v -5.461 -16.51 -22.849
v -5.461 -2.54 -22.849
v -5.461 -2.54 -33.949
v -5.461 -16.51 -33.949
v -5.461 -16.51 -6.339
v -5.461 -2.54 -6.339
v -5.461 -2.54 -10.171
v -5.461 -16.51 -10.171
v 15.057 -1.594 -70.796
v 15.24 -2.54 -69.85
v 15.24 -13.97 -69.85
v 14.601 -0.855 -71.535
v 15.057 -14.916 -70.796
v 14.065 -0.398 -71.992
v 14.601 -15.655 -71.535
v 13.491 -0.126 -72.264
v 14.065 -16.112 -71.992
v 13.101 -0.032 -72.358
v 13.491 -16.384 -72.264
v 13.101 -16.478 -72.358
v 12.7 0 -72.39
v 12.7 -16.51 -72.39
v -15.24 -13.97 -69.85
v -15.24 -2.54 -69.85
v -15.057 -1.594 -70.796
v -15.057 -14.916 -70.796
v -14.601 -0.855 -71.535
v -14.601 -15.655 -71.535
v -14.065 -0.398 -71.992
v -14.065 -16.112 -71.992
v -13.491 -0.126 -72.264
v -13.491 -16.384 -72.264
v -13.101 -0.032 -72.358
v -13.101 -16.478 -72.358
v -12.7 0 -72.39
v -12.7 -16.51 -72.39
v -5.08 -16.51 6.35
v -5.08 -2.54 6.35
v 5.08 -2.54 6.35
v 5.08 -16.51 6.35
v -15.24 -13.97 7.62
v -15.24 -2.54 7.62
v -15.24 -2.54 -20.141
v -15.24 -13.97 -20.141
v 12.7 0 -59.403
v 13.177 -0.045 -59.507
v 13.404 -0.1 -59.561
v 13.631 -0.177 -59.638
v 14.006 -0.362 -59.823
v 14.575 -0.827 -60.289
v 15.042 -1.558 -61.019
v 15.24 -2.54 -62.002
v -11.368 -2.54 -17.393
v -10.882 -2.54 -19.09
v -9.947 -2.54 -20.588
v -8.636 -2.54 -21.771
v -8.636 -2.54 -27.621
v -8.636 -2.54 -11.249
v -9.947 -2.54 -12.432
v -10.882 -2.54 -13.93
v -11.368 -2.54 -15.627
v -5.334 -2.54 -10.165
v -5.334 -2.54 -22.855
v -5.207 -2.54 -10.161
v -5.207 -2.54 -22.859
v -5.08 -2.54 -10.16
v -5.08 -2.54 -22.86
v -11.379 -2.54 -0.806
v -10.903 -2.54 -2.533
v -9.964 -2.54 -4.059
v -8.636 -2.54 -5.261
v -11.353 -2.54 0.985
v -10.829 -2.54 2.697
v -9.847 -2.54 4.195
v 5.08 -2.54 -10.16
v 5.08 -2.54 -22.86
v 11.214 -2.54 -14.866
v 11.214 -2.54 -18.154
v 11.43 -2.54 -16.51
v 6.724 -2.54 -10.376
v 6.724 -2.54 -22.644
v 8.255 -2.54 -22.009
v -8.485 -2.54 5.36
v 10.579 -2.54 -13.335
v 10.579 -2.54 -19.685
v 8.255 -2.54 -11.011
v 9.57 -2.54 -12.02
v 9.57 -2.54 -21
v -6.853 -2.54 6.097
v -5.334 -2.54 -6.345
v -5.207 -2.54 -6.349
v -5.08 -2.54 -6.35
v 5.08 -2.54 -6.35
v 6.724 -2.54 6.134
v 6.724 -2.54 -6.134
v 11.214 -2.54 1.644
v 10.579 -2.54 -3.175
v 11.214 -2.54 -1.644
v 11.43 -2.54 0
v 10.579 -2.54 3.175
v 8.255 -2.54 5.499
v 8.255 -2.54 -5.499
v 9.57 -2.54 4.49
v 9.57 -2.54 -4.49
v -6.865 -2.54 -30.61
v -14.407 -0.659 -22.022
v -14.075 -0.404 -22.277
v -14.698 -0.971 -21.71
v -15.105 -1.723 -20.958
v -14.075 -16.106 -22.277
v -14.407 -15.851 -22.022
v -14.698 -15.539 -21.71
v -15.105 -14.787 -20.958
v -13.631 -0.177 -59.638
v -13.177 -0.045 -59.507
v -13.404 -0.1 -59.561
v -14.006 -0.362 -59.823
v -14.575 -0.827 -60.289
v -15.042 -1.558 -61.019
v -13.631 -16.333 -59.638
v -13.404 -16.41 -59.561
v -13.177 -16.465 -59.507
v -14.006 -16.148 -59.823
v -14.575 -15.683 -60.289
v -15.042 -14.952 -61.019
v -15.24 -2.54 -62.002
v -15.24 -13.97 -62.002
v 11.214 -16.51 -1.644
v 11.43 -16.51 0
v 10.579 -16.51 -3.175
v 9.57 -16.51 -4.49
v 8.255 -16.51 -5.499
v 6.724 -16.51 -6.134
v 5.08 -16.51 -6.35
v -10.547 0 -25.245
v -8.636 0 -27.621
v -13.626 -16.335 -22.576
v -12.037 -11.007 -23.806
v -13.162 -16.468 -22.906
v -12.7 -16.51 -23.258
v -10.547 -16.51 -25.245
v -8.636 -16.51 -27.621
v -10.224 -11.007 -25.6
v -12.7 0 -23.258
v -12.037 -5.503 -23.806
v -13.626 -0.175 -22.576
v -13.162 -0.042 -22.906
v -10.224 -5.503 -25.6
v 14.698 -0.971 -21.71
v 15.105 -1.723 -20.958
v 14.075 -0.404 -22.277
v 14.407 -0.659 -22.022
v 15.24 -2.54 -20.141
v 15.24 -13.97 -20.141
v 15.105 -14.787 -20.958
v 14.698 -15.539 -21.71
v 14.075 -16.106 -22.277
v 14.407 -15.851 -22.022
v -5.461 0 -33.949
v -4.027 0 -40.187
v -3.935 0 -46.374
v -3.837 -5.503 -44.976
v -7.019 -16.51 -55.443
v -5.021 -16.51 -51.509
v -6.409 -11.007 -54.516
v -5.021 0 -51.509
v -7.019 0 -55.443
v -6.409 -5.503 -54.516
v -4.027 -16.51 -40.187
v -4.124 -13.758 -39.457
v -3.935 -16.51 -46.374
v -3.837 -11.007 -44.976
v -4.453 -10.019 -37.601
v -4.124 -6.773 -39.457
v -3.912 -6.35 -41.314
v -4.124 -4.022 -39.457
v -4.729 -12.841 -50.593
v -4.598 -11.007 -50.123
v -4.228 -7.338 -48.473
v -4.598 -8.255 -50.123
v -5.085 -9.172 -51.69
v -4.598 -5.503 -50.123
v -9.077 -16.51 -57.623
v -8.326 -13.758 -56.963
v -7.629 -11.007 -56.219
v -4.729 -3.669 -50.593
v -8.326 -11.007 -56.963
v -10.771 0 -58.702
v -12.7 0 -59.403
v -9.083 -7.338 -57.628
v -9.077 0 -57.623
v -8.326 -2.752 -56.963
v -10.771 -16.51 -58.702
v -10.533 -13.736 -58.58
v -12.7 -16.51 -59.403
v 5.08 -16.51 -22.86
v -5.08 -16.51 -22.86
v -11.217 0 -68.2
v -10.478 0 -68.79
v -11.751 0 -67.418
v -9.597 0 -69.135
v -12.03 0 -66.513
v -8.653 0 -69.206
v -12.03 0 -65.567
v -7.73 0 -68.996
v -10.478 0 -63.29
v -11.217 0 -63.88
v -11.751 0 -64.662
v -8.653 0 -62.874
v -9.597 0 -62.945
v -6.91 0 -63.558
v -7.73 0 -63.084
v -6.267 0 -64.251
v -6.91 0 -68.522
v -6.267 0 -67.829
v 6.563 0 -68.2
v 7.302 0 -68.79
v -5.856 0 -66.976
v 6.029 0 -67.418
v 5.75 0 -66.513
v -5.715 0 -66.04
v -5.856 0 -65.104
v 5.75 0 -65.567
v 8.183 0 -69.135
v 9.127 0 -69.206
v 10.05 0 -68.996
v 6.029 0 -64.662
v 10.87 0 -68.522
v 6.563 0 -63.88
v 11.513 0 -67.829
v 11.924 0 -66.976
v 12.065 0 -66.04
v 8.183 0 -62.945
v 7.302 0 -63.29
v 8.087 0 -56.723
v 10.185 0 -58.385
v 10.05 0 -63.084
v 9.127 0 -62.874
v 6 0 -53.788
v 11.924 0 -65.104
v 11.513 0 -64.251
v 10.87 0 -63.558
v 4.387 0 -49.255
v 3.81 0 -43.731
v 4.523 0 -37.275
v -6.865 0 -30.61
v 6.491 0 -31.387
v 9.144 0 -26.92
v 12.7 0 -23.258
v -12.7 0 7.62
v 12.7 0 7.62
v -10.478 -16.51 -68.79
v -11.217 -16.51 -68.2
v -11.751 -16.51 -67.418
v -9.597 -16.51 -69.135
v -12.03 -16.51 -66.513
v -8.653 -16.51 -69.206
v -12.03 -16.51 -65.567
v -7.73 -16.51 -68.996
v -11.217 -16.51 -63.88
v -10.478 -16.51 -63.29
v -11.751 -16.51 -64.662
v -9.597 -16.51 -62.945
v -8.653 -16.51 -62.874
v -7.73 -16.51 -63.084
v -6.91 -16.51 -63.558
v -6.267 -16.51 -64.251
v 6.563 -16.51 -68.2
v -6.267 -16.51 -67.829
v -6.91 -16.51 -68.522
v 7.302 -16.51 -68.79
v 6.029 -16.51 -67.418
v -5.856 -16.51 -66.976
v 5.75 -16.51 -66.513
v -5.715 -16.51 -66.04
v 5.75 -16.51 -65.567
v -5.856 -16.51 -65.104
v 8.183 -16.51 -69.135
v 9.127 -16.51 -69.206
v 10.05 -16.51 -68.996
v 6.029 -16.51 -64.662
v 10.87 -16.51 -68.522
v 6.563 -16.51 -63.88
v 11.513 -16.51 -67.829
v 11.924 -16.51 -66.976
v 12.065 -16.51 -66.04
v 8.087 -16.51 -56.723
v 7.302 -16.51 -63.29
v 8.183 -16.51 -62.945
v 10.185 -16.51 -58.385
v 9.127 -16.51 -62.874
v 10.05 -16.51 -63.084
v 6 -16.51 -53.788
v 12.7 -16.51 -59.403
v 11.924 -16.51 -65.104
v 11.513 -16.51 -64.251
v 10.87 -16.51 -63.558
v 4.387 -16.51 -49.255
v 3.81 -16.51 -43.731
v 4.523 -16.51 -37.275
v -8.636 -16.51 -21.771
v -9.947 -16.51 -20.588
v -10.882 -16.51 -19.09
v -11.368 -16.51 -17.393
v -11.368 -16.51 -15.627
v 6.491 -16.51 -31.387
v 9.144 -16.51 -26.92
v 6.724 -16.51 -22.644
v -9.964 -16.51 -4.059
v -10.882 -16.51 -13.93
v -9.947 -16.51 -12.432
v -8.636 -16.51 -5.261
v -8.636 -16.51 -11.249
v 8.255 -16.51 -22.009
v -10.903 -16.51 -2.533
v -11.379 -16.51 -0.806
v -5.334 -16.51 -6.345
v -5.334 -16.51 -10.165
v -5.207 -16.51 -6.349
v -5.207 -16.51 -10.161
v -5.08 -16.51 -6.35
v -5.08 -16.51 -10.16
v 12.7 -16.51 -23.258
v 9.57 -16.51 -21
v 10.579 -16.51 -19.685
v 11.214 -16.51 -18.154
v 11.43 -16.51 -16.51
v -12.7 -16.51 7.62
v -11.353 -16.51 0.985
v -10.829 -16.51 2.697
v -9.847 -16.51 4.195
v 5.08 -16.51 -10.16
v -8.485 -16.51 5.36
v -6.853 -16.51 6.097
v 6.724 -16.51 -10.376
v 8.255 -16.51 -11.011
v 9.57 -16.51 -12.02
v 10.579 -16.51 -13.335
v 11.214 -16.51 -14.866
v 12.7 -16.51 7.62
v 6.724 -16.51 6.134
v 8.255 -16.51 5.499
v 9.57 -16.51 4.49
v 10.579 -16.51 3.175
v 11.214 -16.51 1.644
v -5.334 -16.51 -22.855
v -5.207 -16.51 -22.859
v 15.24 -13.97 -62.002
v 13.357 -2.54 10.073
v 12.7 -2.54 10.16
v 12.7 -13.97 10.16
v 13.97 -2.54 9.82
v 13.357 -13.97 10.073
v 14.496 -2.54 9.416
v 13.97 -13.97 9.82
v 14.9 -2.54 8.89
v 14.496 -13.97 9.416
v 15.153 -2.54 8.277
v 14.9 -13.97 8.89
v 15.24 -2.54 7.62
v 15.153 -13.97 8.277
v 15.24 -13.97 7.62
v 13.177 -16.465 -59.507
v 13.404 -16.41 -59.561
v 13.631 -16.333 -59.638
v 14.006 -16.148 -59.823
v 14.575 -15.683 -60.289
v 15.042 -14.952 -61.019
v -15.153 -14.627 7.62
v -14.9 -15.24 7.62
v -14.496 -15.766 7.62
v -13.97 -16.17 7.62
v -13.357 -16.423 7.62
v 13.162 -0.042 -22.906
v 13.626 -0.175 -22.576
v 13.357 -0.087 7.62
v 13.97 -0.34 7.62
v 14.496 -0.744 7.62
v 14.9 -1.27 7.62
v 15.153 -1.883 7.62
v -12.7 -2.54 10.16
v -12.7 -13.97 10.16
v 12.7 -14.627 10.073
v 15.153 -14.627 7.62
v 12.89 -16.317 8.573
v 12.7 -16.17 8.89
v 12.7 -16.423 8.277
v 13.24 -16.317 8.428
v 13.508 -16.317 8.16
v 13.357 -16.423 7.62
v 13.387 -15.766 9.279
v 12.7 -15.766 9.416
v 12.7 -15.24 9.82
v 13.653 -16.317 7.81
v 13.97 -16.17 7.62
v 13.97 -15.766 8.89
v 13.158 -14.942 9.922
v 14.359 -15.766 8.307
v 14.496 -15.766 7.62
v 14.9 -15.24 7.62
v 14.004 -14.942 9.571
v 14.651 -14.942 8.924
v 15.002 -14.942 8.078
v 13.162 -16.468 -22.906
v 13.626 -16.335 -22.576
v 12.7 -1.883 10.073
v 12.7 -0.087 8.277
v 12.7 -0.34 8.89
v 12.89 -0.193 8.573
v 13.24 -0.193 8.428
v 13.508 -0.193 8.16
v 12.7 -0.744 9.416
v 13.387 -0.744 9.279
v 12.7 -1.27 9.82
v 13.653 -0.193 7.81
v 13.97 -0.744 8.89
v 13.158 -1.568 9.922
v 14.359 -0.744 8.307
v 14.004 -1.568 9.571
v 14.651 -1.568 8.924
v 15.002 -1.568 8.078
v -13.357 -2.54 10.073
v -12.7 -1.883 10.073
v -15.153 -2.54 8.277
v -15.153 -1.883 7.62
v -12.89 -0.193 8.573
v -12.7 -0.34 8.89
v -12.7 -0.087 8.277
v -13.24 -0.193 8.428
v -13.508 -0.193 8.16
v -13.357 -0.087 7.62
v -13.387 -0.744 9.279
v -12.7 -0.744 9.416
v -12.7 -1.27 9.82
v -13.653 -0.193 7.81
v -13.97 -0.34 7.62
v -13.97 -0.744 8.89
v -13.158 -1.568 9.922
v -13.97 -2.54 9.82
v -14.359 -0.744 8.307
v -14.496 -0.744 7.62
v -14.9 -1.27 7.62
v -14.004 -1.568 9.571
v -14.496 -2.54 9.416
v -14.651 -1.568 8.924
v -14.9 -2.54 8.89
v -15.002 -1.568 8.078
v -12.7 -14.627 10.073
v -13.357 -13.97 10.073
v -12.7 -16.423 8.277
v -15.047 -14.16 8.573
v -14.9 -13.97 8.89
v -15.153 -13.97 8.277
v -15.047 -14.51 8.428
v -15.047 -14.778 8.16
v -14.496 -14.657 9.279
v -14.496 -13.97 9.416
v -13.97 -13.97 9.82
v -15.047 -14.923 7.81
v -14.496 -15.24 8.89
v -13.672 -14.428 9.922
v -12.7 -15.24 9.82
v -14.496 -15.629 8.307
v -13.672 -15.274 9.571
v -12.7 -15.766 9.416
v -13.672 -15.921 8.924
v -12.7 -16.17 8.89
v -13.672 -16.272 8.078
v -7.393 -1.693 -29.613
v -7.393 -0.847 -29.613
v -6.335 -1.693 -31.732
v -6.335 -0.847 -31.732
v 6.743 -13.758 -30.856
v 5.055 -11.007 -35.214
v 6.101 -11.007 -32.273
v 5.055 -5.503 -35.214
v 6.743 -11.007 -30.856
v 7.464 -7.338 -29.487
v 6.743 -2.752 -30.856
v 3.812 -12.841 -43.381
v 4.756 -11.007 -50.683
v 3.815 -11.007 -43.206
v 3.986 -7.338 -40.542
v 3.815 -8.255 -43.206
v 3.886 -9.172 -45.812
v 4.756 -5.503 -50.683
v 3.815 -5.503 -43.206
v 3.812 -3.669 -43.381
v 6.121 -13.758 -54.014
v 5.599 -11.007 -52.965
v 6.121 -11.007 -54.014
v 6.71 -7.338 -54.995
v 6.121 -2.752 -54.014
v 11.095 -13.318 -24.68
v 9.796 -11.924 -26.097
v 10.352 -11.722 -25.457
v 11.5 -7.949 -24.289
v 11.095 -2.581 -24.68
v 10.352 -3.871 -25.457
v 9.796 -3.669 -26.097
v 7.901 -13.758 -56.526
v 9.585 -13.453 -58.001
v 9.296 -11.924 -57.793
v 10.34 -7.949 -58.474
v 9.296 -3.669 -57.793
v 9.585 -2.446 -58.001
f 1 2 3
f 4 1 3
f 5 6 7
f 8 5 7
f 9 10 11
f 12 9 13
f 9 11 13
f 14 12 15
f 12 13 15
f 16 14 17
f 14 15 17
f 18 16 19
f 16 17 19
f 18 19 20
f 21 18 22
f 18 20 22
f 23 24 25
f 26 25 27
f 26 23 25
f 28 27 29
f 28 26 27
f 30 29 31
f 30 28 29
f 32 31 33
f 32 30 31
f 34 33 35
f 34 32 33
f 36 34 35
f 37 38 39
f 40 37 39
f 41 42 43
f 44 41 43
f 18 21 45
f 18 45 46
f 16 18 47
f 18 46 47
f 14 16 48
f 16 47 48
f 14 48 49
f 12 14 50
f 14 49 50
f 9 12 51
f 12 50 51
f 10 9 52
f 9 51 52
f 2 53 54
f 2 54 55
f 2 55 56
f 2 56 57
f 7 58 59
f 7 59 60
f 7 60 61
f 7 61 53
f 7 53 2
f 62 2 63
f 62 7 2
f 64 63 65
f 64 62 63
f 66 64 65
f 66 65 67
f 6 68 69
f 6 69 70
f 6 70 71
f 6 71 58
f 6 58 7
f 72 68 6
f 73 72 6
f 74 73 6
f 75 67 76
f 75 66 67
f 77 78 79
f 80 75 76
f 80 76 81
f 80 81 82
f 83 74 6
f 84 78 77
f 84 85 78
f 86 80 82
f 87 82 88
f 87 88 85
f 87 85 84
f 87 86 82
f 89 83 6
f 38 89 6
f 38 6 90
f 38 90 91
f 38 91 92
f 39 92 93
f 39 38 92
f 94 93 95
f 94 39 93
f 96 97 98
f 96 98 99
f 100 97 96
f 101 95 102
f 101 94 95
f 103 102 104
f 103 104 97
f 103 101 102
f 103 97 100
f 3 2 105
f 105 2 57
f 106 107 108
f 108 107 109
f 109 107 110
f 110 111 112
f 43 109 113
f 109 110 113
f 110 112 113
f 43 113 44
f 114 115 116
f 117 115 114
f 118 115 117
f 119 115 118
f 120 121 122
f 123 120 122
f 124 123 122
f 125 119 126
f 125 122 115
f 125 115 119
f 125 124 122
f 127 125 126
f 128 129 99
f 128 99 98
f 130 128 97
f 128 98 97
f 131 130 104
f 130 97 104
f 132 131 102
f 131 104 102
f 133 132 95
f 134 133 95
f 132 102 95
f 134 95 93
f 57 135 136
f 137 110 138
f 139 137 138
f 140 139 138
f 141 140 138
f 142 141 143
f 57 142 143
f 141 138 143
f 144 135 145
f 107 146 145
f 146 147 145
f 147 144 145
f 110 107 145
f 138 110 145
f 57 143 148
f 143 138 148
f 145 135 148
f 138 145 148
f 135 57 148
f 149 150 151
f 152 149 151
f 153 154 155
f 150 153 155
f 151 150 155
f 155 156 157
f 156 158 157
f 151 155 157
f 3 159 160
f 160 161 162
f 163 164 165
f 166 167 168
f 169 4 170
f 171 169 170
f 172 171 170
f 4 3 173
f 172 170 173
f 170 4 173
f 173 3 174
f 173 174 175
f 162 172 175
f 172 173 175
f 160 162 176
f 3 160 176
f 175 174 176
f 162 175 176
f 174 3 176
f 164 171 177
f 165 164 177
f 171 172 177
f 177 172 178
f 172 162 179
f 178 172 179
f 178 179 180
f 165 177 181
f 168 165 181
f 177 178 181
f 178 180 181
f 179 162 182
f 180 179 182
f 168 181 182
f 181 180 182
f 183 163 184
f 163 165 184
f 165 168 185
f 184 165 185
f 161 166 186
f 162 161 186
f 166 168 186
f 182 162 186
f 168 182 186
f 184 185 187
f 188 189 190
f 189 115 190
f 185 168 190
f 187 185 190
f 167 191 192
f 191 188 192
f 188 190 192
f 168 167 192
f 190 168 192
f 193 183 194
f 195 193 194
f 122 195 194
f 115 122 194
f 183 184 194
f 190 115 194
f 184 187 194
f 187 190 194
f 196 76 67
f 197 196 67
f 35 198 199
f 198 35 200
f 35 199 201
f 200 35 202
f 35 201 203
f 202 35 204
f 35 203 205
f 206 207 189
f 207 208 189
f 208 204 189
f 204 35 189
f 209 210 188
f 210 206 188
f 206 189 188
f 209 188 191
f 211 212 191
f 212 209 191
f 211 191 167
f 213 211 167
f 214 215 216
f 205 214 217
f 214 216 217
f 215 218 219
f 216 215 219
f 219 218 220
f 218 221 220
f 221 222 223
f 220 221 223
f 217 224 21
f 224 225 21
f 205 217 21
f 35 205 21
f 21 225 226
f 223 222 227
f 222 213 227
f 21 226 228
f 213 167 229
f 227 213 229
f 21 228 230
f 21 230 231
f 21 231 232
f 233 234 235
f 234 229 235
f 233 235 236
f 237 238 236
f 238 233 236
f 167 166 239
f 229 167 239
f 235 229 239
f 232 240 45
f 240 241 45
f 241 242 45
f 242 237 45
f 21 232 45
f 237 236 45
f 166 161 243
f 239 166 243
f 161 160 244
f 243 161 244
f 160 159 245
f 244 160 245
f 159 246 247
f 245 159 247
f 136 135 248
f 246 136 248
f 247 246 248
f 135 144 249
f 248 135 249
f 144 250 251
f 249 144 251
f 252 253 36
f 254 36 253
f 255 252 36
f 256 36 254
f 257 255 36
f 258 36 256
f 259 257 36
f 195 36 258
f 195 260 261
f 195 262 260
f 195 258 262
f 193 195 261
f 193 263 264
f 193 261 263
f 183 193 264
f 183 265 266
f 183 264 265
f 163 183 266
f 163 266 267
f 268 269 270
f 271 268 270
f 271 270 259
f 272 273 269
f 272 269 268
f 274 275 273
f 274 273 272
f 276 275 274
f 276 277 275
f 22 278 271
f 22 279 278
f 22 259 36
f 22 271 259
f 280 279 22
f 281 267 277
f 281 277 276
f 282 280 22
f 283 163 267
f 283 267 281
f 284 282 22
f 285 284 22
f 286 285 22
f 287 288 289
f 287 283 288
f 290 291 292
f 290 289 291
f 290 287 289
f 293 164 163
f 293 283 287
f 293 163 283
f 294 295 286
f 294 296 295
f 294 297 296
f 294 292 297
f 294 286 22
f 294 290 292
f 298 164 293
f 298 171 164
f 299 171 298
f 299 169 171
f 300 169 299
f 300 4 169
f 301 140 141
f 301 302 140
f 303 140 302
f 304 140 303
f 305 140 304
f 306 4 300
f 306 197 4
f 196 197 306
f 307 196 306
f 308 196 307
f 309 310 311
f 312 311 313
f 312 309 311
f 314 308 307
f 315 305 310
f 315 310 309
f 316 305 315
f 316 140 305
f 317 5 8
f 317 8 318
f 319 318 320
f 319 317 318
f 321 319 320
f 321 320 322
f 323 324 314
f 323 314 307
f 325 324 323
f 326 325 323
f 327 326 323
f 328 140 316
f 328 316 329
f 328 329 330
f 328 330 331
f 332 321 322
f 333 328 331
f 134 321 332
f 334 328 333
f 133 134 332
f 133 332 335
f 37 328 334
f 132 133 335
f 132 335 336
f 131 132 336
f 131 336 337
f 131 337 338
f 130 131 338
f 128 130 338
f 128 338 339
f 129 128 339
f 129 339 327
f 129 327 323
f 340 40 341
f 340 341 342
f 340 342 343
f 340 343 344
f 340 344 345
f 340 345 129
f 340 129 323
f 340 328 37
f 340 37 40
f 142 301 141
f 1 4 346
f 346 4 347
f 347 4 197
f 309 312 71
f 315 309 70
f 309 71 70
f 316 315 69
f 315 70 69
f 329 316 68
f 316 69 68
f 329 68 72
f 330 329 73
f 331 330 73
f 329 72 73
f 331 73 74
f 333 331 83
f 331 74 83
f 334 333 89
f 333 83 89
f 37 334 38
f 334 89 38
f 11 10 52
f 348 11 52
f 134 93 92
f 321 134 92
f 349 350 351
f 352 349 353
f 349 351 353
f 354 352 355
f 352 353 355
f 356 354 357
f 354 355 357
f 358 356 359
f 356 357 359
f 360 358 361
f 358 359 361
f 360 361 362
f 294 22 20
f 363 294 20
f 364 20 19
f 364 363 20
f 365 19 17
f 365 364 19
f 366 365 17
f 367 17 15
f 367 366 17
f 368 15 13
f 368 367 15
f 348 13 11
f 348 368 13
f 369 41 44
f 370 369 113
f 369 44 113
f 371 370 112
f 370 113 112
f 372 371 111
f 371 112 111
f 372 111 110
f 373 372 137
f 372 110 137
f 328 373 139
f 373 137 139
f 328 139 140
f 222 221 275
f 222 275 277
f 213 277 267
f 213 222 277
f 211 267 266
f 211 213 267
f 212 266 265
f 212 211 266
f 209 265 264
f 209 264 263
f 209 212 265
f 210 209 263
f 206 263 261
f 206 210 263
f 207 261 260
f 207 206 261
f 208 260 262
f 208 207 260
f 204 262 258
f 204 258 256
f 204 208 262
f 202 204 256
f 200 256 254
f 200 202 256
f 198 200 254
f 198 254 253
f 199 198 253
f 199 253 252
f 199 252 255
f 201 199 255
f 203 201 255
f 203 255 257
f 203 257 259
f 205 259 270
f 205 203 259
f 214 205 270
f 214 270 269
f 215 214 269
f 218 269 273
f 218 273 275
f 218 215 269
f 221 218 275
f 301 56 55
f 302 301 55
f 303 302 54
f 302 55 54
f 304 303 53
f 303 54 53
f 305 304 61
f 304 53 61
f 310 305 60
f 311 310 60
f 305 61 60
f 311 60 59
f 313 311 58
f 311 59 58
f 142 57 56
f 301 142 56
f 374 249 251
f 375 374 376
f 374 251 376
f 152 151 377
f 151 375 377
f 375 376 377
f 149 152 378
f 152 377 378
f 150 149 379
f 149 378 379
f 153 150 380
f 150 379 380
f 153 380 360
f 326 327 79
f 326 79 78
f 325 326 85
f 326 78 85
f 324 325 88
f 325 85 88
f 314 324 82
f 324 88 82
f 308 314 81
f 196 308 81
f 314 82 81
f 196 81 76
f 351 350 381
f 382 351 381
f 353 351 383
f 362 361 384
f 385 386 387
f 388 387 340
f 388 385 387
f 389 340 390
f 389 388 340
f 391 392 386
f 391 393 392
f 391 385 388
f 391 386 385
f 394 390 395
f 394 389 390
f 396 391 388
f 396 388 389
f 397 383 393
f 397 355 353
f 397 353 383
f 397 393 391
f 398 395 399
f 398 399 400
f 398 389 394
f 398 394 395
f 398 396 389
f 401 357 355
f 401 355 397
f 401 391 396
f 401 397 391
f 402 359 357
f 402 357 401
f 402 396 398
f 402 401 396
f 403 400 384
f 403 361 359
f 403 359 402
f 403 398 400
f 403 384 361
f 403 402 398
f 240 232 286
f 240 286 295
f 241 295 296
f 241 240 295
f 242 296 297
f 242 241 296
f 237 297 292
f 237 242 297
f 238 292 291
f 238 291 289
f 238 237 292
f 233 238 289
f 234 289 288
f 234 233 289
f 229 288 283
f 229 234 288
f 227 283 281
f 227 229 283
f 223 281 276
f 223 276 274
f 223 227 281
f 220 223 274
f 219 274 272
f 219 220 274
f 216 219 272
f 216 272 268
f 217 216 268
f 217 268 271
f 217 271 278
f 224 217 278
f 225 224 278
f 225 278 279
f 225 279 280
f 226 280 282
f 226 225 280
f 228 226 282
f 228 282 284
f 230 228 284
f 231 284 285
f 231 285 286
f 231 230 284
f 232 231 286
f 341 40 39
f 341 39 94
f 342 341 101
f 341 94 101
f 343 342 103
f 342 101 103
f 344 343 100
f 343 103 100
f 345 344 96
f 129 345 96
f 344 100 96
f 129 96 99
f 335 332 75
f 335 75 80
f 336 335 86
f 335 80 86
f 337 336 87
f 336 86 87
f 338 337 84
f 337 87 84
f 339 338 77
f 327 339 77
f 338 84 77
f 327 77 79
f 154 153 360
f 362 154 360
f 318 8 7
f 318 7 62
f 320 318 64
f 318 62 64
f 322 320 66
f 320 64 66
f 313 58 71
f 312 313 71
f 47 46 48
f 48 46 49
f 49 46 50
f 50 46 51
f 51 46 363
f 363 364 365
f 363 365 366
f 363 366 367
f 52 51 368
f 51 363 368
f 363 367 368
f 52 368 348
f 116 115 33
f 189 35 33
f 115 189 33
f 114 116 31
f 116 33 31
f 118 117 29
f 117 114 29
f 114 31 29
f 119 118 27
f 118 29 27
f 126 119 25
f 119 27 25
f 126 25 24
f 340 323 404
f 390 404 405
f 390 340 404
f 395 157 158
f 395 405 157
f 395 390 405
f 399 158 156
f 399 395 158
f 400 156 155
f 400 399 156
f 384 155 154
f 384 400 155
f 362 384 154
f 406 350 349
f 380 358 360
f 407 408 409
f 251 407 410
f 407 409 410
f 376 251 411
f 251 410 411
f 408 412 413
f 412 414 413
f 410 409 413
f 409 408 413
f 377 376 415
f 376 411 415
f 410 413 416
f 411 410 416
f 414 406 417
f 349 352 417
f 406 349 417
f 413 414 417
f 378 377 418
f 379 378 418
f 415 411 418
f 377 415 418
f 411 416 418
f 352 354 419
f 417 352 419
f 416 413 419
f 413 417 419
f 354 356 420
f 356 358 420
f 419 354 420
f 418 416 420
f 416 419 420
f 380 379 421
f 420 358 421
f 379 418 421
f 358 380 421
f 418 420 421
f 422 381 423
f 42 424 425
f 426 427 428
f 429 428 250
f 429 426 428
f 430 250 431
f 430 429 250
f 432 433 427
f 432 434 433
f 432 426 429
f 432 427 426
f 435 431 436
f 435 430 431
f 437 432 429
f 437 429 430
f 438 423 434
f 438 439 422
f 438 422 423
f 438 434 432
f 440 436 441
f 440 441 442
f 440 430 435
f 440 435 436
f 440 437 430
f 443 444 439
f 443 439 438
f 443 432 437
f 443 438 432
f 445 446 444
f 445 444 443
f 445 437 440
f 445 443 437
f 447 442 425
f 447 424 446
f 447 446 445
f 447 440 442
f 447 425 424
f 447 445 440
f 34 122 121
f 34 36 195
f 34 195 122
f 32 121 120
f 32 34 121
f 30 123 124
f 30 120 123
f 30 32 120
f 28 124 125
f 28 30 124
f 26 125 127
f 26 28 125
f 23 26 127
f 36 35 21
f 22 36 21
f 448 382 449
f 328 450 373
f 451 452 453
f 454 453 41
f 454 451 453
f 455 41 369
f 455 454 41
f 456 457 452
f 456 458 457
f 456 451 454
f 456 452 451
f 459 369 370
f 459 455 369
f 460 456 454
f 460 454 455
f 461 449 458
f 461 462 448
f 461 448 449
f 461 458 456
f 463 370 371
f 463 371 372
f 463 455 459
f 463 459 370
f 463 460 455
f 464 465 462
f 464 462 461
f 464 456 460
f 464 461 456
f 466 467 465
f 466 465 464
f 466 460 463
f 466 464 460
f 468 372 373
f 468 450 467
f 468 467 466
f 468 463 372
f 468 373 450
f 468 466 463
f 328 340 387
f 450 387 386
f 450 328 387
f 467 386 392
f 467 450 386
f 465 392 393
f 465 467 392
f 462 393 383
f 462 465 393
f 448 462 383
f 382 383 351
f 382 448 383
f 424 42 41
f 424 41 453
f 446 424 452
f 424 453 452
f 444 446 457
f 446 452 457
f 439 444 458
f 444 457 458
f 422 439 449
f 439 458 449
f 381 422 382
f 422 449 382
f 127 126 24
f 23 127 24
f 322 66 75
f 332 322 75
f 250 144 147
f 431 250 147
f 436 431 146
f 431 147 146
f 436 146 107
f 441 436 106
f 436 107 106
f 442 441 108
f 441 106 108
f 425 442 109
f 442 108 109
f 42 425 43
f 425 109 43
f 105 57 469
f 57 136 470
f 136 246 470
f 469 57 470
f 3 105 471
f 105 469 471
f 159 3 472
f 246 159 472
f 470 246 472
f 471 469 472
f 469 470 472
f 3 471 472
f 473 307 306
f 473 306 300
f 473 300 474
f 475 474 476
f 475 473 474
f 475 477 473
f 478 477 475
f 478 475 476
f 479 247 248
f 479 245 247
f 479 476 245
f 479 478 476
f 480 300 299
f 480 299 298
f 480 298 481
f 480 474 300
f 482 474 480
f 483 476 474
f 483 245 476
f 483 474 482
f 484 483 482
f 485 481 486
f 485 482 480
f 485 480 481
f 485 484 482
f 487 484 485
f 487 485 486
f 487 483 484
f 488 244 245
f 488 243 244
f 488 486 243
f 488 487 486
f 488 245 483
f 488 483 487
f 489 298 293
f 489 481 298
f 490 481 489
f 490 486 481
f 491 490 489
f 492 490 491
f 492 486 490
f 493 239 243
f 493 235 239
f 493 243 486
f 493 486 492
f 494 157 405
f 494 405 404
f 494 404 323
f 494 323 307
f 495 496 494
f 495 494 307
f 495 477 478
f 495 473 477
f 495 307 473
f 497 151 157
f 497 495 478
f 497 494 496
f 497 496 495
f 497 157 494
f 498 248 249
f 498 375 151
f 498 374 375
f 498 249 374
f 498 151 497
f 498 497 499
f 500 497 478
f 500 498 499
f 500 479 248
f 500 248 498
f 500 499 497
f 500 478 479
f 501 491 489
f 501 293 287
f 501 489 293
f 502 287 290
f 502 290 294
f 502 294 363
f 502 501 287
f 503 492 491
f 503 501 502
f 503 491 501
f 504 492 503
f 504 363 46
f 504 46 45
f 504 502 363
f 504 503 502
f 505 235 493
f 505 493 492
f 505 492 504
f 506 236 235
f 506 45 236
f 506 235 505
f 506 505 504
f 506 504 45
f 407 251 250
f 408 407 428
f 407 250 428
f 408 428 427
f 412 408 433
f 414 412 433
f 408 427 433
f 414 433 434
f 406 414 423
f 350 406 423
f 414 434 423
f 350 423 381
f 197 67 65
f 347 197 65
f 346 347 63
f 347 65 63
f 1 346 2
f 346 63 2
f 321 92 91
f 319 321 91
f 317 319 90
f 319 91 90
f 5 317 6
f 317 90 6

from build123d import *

# Parameters (mm, degrees)
F0_R     = 3.175
F1_DEPTH = 16.51
F2_DEPTH = 2.54
F3_R     = 2.54


# Not quite as in the source:
# - a feature names something its author has since deleted; it is built from what else it names


with BuildPart() as f1:
    # F0 (on Front) → F1 (new body)
    with BuildSketch(Plane.XZ):
        with BuildLine():
            Line((15.24, 10.16), (0, 10.16))
            Line((0, 10.16), (-15.24, 10.16))
            Line((-15.24, 10.16), (-15.24, -21.59))
            add(Edge.make_bspline(
                [(-15.24, -21.59), (-12.5713715272, -23.0241692542), (-10.3700381938, -25.1273333514), (-8.636, -27.620696738)],
                knots=[0, 0, 0, 0, 6.6715711821, 6.6715711821, 6.6715711821, 6.6715711821], degree=3))
            Line((-8.636, -27.620696738), (-8.636, -21.770928055))
            ThreePointArc((-8.636, -21.770928055), (-11.43, -16.51), (-8.636, -11.249071945))
            Line((-8.636, -11.249071945), (-8.636, -5.260928055))
            ThreePointArc((-8.636, -5.260928055), (-11.1516304709, 1.8595169871), (-5.08, 6.35))
            Line((-5.08, 6.35), (5.08, 6.35))
            ThreePointArc((5.08, 6.35), (9.5701280605, 4.4901280605), (11.43, 0))
            ThreePointArc((11.43, 0), (9.5701280605, -4.4901280605), (5.08, -6.35))
            Line((5.08, -6.35), (-5.08, -6.35))
            ThreePointArc((-5.08, -6.35), (-5.2705858603, -6.3471392792), (-5.461, -6.3385596944))
            Line((-5.461, -6.3385596944), (-5.461, -10.1714403056))
            ThreePointArc((-5.461, -10.1714403056), (-5.2705858603, -10.1628607208), (-5.08, -10.16))
            Line((-5.08, -10.16), (5.08, -10.16))
            ThreePointArc((5.08, -10.16), (9.5701280605, -12.0198719395), (11.43, -16.51))
            ThreePointArc((11.43, -16.51), (9.5701280605, -21.0001280605), (5.08, -22.86))
            Line((5.08, -22.86), (-5.08, -22.86))
            ThreePointArc((-5.08, -22.86), (-5.2705858603, -22.8571392792), (-5.461, -22.8485596944))
            Line((-5.461, -22.8485596944), (-5.461, -33.9487214282))
            add(Edge.make_bspline(
                [(-5.461, -33.9487214282), (-1.4642877536, -45.4909328609), (-4.7239544203, -59.7580237479), (-15.24, -59.69)],
                knots=[11.8098860506, 11.8098860506, 11.8098860506, 11.8098860506, 38.1, 38.1, 38.1, 38.1], degree=3))
            Line((-15.24, -59.69), (-15.24, -72.39))
            Line((-15.24, -72.39), (15.24, -72.39))
            Line((15.24, -72.39), (15.24, -59.69))
            add(Edge.make_bspline(
                [(15.24, -21.59), (0, -29.7802519053), (0, -59.7885809647), (15.24, -59.69)],
                knots=[0, 0, 0, 0, 38.1, 38.1, 38.1, 38.1], degree=3))
            Line((15.24, -21.59), (15.24, 10.16))
        make_face()
        with Locations((-8.89, -66.04)):
            Circle(F0_R, mode=Mode.SUBTRACT)
        with Locations((8.89, -66.04)):
            Circle(F0_R, mode=Mode.SUBTRACT)
    extrude(amount=F1_DEPTH)

    # F0 (on Front) → F2 (join)
    with BuildSketch(Plane.XZ):
        with BuildLine():
            ThreePointArc((-5.08, 6.35), (-11.1516304709, 1.8595169871), (-8.636, -5.260928055))
            ThreePointArc((-8.636, -5.260928055), (-7.1209102718, -6.0130845048), (-5.461, -6.3385596944))
            ThreePointArc((-5.461, -6.3385596944), (-5.2705858603, -6.3471392792), (-5.08, -6.35))
            ThreePointArc((-5.08, -6.35), (-2.2401936686, -5.6796126628), (0, -3.81))
            ThreePointArc((0, -3.81), (-1.27, 0), (0, 3.81))
            ThreePointArc((0, 3.81), (-2.2401936686, 5.6796126628), (-5.08, 6.35))
        make_face()
        with BuildLine():
            ThreePointArc((5.08, 6.35), (2.2401936686, 5.6796126628), (0, 3.81))
            ThreePointArc((0, 3.81), (0.9441389426, 2.0080463142), (1.27, 0))
            ThreePointArc((1.27, 0), (0.9441389426, -2.0080463142), (0, -3.81))
            ThreePointArc((0, -3.81), (2.2401936686, -5.6796126628), (5.08, -6.35))
            ThreePointArc((5.08, -6.35), (9.5701280605, -4.4901280605), (11.43, 0))
            ThreePointArc((11.43, 0), (9.5701280605, 4.4901280605), (5.08, 6.35))
        make_face()
        with BuildLine():
            Line((5.08, 6.35), (-5.08, 6.35))
            ThreePointArc((-5.08, 6.35), (-2.2401936686, 5.6796126628), (0, 3.81))
            ThreePointArc((0, 3.81), (2.2401936686, 5.6796126628), (5.08, 6.35))
        make_face()
        with BuildLine():
            ThreePointArc((1.27, 0), (0.9441389426, 2.0080463142), (0, 3.81))
            ThreePointArc((0, 3.81), (-1.27, 0), (0, -3.81))
            ThreePointArc((0, -3.81), (0.9441389426, -2.0080463142), (1.27, 0))
        make_face()
        with BuildLine():
            ThreePointArc((0, -3.81), (-2.2401936686, -5.6796126628), (-5.08, -6.35))
            Line((-5.08, -6.35), (5.08, -6.35))
            ThreePointArc((5.08, -6.35), (2.2401936686, -5.6796126628), (0, -3.81))
        make_face()
        with BuildLine():
            Line((-5.461, -22.5981636269), (-5.461, -22.8485596944))
            ThreePointArc((-5.461, -22.8485596944), (-5.2705858603, -22.8571392792), (-5.08, -22.86))
            ThreePointArc((-5.08, -22.86), (-2.2401936686, -22.1896126628), (0, -20.32))
            ThreePointArc((0, -20.32), (-1.27, -16.51), (0, -12.7))
            ThreePointArc((0, -12.7), (-2.2401936686, -10.8303873372), (-5.08, -10.16))
            ThreePointArc((-5.08, -10.16), (-5.2705858603, -10.1628607208), (-5.461, -10.1714403056))
            Line((-5.461, -10.1714403056), (-5.461, -22.5981636269))
        make_face()
        with BuildLine():
            ThreePointArc((0, -12.7), (-1.27, -16.51), (0, -20.32))
            ThreePointArc((0, -20.32), (0.9441389426, -18.5180463142), (1.27, -16.51))
            ThreePointArc((1.27, -16.51), (0.9441389426, -14.5019536858), (0, -12.7))
        make_face()
        with BuildLine():
            Line((5.08, -10.16), (-5.08, -10.16))
            ThreePointArc((-5.08, -10.16), (-2.2401936686, -10.8303873372), (0, -12.7))
            ThreePointArc((0, -12.7), (2.2401936686, -10.8303873372), (5.08, -10.16))
        make_face()
        with BuildLine():
            ThreePointArc((1.27, -16.51), (0.9441389426, -18.5180463142), (0, -20.32))
            ThreePointArc((0, -20.32), (2.2401936686, -22.1896126628), (5.08, -22.86))
            ThreePointArc((5.08, -22.86), (9.5701280605, -21.0001280605), (11.43, -16.51))
            ThreePointArc((11.43, -16.51), (9.5701280605, -12.0198719395), (5.08, -10.16))
            ThreePointArc((5.08, -10.16), (2.2401936686, -10.8303873372), (0, -12.7))
            ThreePointArc((0, -12.7), (0.9441389426, -14.5019536858), (1.27, -16.51))
        make_face()
        with BuildLine():
            ThreePointArc((0, -20.32), (-2.2401936686, -22.1896126628), (-5.08, -22.86))
            Line((-5.08, -22.86), (5.08, -22.86))
            ThreePointArc((5.08, -22.86), (2.2401936686, -22.1896126628), (0, -20.32))
        make_face()
        with BuildLine():
            Line((-8.636, -21.770928055), (-8.636, -27.620696738))
            add(Edge.make_bspline(
                [(-8.636, -27.620696738), (-7.3004773786, -29.5410369116), (-6.2421440453, -31.6928347959), (-5.461, -33.9487214282)],
                knots=[6.6715711821, 6.6715711821, 6.6715711821, 6.6715711821, 11.8098860506, 11.8098860506, 11.8098860506, 11.8098860506], degree=3))
            Line((-5.461, -33.9487214282), (-5.461, -22.8485596944))
            ThreePointArc((-5.461, -22.8485596944), (-7.1209102718, -22.5230845048), (-8.636, -21.770928055))
        make_face()
        with BuildLine():
            Line((-8.636, -5.260928055), (-8.636, -11.249071945))
            ThreePointArc((-8.636, -11.249071945), (-7.1209102718, -10.4969154952), (-5.461, -10.1714403056))
            Line((-5.461, -10.1714403056), (-5.461, -6.3385596944))
            ThreePointArc((-5.461, -6.3385596944), (-7.1209102718, -6.0130845048), (-8.636, -5.260928055))
        make_face()
        with BuildLine():
            ThreePointArc((-8.636, -11.249071945), (-11.43, -16.51), (-8.636, -21.770928055))
            ThreePointArc((-8.636, -21.770928055), (-7.1209102718, -22.5230845048), (-5.461, -22.8485596944))
            Line((-5.461, -22.8485596944), (-5.461, -22.5981636269))
            Line((-5.461, -22.5981636269), (-5.461, -10.1714403056))
            ThreePointArc((-5.461, -10.1714403056), (-7.1209102718, -10.4969154952), (-8.636, -11.249071945))
        make_face()
    extrude(amount=F2_DEPTH)

    # F3
    f3_edges = [f1.edges().sort_by_distance(p)[0] for p in [
        (15.24, -8.255, 10.16),
        (0, -16.51, 10.16),
        (-15.24, -8.255, 10.16),
        (0, 0, 10.16),
        (15.24, -8.255, -21.59),
        (15.24, 0, -5.715),
        (15.24, -16.51, -5.715),
        (-15.24, -8.255, -21.59),
        (-15.24, 0, -5.715),
        (-15.24, -16.51, -5.715),
        (15.24, -8.255, -72.39),
        (15.24, -8.255, -59.69),
        (15.24, 0, -66.04),
        (15.24, -16.51, -66.04),
        (-15.24, -8.255, -59.69),
        (-15.24, -8.255, -72.39),
        (-15.24, 0, -66.04),
        (-15.24, -16.51, -66.04),
    ]]
    fillet(f3_edges, radius=F3_R)


solid = f1.part
